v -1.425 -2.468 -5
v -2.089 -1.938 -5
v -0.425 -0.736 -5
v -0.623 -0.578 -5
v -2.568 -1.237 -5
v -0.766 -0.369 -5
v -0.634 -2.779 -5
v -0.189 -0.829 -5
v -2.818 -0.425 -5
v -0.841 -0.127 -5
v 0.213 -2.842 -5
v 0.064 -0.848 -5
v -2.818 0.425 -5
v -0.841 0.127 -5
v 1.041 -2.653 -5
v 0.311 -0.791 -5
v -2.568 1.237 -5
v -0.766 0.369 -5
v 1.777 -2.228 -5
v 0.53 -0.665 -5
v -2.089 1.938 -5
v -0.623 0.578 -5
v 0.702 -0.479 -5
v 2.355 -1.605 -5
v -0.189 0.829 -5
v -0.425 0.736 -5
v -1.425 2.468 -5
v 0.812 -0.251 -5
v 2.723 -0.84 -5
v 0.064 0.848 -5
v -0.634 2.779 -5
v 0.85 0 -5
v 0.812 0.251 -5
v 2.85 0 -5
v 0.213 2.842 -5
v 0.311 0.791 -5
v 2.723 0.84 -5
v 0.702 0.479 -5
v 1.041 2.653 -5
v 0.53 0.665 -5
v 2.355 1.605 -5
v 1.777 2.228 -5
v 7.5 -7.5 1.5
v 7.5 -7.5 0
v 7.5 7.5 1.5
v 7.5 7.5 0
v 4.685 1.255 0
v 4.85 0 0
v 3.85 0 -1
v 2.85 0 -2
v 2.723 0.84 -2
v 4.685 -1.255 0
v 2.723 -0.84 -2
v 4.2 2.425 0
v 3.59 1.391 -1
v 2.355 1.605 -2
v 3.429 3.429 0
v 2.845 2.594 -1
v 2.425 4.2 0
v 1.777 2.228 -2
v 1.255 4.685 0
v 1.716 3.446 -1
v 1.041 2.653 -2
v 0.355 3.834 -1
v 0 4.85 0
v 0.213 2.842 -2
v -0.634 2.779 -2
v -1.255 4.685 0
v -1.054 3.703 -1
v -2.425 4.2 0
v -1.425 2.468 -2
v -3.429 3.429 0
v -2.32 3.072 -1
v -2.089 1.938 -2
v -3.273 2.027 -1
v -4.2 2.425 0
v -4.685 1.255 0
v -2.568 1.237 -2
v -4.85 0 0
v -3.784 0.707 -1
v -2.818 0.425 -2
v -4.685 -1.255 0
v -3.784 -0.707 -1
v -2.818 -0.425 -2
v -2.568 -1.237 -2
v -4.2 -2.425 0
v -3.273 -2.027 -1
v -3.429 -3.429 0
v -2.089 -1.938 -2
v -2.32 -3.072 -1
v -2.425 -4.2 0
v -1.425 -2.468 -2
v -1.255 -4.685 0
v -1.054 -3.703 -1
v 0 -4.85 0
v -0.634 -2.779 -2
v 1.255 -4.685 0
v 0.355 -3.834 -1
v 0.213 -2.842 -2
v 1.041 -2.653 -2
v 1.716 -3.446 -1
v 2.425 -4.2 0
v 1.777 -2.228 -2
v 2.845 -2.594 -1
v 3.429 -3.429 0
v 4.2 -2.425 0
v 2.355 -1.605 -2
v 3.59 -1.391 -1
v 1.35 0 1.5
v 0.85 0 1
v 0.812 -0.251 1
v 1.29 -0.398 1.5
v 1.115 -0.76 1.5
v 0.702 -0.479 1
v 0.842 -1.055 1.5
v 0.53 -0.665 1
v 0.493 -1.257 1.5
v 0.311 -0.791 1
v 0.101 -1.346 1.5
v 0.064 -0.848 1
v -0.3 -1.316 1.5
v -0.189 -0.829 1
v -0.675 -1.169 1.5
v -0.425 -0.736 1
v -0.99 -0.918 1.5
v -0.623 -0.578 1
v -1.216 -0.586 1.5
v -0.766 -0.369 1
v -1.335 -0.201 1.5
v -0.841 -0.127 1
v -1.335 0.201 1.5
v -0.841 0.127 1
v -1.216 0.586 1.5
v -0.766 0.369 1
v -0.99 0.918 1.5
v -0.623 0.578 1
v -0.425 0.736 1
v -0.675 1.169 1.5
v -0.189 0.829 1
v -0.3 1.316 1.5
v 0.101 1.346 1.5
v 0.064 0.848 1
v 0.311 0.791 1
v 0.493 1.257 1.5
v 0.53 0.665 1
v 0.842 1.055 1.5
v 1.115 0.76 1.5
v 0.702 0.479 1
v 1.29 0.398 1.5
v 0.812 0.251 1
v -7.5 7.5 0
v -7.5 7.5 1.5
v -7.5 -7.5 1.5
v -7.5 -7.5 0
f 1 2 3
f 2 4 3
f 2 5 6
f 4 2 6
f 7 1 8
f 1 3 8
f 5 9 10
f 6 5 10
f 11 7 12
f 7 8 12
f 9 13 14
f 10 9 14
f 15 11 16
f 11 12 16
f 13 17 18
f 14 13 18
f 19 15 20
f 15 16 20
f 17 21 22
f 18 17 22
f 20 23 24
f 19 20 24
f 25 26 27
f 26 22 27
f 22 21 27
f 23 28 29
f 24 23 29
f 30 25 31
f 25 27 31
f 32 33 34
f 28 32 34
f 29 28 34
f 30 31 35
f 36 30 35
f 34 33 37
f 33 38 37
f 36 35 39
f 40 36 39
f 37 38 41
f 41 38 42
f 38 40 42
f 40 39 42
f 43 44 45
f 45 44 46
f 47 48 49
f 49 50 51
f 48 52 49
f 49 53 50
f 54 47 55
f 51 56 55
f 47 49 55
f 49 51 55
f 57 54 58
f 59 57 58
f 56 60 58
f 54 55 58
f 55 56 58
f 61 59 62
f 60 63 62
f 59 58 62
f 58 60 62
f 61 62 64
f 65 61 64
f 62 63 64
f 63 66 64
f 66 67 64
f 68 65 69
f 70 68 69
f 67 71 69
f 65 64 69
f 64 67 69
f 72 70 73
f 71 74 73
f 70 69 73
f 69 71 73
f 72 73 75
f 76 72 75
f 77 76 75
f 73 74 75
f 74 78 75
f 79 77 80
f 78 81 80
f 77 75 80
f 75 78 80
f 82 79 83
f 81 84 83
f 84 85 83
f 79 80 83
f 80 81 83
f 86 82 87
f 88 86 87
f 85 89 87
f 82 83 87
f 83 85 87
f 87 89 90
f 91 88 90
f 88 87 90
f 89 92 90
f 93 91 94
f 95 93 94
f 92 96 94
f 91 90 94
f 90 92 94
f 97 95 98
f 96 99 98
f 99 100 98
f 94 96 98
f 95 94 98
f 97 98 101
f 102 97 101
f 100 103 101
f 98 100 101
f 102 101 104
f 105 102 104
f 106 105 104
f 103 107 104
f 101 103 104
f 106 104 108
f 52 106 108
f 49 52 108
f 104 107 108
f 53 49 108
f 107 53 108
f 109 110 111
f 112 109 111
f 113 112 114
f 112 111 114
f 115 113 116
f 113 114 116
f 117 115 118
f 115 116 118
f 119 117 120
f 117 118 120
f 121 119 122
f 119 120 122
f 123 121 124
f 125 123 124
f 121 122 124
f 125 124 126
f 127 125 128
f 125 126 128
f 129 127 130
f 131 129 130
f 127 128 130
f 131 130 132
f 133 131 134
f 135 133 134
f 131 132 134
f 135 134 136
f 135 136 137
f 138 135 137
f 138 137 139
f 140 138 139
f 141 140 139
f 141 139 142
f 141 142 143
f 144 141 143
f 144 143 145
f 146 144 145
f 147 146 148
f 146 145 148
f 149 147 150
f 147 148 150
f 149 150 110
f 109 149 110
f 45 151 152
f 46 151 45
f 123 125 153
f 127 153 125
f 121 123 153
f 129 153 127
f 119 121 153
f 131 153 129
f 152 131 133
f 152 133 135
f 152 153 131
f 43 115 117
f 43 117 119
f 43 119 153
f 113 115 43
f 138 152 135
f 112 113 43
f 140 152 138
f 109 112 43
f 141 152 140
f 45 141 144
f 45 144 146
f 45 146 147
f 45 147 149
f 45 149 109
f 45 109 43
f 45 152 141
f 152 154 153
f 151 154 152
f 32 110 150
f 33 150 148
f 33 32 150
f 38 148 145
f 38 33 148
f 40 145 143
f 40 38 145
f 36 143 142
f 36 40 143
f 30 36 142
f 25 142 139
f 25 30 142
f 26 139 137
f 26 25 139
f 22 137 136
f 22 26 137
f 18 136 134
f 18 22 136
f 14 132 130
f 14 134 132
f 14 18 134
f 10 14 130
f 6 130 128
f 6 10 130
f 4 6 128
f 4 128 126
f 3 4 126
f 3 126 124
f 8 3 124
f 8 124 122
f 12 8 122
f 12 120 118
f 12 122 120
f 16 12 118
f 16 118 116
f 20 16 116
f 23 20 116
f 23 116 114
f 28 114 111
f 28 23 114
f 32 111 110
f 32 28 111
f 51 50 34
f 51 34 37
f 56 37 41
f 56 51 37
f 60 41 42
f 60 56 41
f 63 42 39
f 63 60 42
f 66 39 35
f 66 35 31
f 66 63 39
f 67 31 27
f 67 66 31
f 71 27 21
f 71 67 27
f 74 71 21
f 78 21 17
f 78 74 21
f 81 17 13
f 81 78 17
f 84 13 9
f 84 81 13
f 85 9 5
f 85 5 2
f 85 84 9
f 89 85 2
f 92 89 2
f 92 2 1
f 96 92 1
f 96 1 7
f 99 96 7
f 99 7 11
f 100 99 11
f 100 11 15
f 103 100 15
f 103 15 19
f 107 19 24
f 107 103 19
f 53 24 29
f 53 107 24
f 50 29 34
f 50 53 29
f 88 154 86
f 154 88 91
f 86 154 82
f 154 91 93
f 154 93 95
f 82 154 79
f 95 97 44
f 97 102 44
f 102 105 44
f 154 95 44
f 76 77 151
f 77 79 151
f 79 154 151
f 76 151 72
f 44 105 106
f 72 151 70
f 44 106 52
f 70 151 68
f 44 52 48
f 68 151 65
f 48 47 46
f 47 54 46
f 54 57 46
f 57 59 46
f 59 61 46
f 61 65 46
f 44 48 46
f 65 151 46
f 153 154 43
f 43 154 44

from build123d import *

# Parameters (mm, degrees)
SKETCH_2_W          = 15
SKETCH_2_H          = 15
EXTRUDE_358_DEPTH   = 1.5
SKETCH_3_R          = 2.85
SKETCH_3_R_2        = 0.85
EXTRUDE_486_DEPTH   = 5
CHAMFER_1_SIZE      = 2
SKETCH_5_R          = 0.85
CUT_EXTRUDE_2_DEPTH = 12.7260394
CHAMFER_3_SIZE      = 0.5


with BuildPart() as part:
    # Эскиз2 → Extrude 358 (new body)
    with BuildSketch(Plane.XY):
        Rectangle(SKETCH_2_W, SKETCH_2_H)
    extrude(amount=EXTRUDE_358_DEPTH)

    # Эскиз3 → Extrude 486 (add)
    with BuildSketch(Plane.XY):
        Circle(SKETCH_3_R)
        Circle(SKETCH_3_R_2, mode=Mode.SUBTRACT)
    extrude(amount=-EXTRUDE_486_DEPTH)

    # Фаска1
    chamfer_1_edges = [part.edges().sort_by_distance(p)[0] for p in [
        (-2.85, 0, 0),
    ]]
    chamfer(chamfer_1_edges, length=CHAMFER_1_SIZE)

    # Эскиз5 → Вырез-Вытянуть2 (cut, through all)
    with BuildSketch(Plane.XY):
        Circle(SKETCH_5_R)
    extrude(amount=CUT_EXTRUDE_2_DEPTH, mode=Mode.SUBTRACT)

    # Фаска3
    chamfer_3_edges = [part.edges().sort_by_distance(p)[0] for p in [
        (-0.85, 0, 1.5),
    ]]
    chamfer(chamfer_3_edges, length=CHAMFER_3_SIZE)


solid = part.part
